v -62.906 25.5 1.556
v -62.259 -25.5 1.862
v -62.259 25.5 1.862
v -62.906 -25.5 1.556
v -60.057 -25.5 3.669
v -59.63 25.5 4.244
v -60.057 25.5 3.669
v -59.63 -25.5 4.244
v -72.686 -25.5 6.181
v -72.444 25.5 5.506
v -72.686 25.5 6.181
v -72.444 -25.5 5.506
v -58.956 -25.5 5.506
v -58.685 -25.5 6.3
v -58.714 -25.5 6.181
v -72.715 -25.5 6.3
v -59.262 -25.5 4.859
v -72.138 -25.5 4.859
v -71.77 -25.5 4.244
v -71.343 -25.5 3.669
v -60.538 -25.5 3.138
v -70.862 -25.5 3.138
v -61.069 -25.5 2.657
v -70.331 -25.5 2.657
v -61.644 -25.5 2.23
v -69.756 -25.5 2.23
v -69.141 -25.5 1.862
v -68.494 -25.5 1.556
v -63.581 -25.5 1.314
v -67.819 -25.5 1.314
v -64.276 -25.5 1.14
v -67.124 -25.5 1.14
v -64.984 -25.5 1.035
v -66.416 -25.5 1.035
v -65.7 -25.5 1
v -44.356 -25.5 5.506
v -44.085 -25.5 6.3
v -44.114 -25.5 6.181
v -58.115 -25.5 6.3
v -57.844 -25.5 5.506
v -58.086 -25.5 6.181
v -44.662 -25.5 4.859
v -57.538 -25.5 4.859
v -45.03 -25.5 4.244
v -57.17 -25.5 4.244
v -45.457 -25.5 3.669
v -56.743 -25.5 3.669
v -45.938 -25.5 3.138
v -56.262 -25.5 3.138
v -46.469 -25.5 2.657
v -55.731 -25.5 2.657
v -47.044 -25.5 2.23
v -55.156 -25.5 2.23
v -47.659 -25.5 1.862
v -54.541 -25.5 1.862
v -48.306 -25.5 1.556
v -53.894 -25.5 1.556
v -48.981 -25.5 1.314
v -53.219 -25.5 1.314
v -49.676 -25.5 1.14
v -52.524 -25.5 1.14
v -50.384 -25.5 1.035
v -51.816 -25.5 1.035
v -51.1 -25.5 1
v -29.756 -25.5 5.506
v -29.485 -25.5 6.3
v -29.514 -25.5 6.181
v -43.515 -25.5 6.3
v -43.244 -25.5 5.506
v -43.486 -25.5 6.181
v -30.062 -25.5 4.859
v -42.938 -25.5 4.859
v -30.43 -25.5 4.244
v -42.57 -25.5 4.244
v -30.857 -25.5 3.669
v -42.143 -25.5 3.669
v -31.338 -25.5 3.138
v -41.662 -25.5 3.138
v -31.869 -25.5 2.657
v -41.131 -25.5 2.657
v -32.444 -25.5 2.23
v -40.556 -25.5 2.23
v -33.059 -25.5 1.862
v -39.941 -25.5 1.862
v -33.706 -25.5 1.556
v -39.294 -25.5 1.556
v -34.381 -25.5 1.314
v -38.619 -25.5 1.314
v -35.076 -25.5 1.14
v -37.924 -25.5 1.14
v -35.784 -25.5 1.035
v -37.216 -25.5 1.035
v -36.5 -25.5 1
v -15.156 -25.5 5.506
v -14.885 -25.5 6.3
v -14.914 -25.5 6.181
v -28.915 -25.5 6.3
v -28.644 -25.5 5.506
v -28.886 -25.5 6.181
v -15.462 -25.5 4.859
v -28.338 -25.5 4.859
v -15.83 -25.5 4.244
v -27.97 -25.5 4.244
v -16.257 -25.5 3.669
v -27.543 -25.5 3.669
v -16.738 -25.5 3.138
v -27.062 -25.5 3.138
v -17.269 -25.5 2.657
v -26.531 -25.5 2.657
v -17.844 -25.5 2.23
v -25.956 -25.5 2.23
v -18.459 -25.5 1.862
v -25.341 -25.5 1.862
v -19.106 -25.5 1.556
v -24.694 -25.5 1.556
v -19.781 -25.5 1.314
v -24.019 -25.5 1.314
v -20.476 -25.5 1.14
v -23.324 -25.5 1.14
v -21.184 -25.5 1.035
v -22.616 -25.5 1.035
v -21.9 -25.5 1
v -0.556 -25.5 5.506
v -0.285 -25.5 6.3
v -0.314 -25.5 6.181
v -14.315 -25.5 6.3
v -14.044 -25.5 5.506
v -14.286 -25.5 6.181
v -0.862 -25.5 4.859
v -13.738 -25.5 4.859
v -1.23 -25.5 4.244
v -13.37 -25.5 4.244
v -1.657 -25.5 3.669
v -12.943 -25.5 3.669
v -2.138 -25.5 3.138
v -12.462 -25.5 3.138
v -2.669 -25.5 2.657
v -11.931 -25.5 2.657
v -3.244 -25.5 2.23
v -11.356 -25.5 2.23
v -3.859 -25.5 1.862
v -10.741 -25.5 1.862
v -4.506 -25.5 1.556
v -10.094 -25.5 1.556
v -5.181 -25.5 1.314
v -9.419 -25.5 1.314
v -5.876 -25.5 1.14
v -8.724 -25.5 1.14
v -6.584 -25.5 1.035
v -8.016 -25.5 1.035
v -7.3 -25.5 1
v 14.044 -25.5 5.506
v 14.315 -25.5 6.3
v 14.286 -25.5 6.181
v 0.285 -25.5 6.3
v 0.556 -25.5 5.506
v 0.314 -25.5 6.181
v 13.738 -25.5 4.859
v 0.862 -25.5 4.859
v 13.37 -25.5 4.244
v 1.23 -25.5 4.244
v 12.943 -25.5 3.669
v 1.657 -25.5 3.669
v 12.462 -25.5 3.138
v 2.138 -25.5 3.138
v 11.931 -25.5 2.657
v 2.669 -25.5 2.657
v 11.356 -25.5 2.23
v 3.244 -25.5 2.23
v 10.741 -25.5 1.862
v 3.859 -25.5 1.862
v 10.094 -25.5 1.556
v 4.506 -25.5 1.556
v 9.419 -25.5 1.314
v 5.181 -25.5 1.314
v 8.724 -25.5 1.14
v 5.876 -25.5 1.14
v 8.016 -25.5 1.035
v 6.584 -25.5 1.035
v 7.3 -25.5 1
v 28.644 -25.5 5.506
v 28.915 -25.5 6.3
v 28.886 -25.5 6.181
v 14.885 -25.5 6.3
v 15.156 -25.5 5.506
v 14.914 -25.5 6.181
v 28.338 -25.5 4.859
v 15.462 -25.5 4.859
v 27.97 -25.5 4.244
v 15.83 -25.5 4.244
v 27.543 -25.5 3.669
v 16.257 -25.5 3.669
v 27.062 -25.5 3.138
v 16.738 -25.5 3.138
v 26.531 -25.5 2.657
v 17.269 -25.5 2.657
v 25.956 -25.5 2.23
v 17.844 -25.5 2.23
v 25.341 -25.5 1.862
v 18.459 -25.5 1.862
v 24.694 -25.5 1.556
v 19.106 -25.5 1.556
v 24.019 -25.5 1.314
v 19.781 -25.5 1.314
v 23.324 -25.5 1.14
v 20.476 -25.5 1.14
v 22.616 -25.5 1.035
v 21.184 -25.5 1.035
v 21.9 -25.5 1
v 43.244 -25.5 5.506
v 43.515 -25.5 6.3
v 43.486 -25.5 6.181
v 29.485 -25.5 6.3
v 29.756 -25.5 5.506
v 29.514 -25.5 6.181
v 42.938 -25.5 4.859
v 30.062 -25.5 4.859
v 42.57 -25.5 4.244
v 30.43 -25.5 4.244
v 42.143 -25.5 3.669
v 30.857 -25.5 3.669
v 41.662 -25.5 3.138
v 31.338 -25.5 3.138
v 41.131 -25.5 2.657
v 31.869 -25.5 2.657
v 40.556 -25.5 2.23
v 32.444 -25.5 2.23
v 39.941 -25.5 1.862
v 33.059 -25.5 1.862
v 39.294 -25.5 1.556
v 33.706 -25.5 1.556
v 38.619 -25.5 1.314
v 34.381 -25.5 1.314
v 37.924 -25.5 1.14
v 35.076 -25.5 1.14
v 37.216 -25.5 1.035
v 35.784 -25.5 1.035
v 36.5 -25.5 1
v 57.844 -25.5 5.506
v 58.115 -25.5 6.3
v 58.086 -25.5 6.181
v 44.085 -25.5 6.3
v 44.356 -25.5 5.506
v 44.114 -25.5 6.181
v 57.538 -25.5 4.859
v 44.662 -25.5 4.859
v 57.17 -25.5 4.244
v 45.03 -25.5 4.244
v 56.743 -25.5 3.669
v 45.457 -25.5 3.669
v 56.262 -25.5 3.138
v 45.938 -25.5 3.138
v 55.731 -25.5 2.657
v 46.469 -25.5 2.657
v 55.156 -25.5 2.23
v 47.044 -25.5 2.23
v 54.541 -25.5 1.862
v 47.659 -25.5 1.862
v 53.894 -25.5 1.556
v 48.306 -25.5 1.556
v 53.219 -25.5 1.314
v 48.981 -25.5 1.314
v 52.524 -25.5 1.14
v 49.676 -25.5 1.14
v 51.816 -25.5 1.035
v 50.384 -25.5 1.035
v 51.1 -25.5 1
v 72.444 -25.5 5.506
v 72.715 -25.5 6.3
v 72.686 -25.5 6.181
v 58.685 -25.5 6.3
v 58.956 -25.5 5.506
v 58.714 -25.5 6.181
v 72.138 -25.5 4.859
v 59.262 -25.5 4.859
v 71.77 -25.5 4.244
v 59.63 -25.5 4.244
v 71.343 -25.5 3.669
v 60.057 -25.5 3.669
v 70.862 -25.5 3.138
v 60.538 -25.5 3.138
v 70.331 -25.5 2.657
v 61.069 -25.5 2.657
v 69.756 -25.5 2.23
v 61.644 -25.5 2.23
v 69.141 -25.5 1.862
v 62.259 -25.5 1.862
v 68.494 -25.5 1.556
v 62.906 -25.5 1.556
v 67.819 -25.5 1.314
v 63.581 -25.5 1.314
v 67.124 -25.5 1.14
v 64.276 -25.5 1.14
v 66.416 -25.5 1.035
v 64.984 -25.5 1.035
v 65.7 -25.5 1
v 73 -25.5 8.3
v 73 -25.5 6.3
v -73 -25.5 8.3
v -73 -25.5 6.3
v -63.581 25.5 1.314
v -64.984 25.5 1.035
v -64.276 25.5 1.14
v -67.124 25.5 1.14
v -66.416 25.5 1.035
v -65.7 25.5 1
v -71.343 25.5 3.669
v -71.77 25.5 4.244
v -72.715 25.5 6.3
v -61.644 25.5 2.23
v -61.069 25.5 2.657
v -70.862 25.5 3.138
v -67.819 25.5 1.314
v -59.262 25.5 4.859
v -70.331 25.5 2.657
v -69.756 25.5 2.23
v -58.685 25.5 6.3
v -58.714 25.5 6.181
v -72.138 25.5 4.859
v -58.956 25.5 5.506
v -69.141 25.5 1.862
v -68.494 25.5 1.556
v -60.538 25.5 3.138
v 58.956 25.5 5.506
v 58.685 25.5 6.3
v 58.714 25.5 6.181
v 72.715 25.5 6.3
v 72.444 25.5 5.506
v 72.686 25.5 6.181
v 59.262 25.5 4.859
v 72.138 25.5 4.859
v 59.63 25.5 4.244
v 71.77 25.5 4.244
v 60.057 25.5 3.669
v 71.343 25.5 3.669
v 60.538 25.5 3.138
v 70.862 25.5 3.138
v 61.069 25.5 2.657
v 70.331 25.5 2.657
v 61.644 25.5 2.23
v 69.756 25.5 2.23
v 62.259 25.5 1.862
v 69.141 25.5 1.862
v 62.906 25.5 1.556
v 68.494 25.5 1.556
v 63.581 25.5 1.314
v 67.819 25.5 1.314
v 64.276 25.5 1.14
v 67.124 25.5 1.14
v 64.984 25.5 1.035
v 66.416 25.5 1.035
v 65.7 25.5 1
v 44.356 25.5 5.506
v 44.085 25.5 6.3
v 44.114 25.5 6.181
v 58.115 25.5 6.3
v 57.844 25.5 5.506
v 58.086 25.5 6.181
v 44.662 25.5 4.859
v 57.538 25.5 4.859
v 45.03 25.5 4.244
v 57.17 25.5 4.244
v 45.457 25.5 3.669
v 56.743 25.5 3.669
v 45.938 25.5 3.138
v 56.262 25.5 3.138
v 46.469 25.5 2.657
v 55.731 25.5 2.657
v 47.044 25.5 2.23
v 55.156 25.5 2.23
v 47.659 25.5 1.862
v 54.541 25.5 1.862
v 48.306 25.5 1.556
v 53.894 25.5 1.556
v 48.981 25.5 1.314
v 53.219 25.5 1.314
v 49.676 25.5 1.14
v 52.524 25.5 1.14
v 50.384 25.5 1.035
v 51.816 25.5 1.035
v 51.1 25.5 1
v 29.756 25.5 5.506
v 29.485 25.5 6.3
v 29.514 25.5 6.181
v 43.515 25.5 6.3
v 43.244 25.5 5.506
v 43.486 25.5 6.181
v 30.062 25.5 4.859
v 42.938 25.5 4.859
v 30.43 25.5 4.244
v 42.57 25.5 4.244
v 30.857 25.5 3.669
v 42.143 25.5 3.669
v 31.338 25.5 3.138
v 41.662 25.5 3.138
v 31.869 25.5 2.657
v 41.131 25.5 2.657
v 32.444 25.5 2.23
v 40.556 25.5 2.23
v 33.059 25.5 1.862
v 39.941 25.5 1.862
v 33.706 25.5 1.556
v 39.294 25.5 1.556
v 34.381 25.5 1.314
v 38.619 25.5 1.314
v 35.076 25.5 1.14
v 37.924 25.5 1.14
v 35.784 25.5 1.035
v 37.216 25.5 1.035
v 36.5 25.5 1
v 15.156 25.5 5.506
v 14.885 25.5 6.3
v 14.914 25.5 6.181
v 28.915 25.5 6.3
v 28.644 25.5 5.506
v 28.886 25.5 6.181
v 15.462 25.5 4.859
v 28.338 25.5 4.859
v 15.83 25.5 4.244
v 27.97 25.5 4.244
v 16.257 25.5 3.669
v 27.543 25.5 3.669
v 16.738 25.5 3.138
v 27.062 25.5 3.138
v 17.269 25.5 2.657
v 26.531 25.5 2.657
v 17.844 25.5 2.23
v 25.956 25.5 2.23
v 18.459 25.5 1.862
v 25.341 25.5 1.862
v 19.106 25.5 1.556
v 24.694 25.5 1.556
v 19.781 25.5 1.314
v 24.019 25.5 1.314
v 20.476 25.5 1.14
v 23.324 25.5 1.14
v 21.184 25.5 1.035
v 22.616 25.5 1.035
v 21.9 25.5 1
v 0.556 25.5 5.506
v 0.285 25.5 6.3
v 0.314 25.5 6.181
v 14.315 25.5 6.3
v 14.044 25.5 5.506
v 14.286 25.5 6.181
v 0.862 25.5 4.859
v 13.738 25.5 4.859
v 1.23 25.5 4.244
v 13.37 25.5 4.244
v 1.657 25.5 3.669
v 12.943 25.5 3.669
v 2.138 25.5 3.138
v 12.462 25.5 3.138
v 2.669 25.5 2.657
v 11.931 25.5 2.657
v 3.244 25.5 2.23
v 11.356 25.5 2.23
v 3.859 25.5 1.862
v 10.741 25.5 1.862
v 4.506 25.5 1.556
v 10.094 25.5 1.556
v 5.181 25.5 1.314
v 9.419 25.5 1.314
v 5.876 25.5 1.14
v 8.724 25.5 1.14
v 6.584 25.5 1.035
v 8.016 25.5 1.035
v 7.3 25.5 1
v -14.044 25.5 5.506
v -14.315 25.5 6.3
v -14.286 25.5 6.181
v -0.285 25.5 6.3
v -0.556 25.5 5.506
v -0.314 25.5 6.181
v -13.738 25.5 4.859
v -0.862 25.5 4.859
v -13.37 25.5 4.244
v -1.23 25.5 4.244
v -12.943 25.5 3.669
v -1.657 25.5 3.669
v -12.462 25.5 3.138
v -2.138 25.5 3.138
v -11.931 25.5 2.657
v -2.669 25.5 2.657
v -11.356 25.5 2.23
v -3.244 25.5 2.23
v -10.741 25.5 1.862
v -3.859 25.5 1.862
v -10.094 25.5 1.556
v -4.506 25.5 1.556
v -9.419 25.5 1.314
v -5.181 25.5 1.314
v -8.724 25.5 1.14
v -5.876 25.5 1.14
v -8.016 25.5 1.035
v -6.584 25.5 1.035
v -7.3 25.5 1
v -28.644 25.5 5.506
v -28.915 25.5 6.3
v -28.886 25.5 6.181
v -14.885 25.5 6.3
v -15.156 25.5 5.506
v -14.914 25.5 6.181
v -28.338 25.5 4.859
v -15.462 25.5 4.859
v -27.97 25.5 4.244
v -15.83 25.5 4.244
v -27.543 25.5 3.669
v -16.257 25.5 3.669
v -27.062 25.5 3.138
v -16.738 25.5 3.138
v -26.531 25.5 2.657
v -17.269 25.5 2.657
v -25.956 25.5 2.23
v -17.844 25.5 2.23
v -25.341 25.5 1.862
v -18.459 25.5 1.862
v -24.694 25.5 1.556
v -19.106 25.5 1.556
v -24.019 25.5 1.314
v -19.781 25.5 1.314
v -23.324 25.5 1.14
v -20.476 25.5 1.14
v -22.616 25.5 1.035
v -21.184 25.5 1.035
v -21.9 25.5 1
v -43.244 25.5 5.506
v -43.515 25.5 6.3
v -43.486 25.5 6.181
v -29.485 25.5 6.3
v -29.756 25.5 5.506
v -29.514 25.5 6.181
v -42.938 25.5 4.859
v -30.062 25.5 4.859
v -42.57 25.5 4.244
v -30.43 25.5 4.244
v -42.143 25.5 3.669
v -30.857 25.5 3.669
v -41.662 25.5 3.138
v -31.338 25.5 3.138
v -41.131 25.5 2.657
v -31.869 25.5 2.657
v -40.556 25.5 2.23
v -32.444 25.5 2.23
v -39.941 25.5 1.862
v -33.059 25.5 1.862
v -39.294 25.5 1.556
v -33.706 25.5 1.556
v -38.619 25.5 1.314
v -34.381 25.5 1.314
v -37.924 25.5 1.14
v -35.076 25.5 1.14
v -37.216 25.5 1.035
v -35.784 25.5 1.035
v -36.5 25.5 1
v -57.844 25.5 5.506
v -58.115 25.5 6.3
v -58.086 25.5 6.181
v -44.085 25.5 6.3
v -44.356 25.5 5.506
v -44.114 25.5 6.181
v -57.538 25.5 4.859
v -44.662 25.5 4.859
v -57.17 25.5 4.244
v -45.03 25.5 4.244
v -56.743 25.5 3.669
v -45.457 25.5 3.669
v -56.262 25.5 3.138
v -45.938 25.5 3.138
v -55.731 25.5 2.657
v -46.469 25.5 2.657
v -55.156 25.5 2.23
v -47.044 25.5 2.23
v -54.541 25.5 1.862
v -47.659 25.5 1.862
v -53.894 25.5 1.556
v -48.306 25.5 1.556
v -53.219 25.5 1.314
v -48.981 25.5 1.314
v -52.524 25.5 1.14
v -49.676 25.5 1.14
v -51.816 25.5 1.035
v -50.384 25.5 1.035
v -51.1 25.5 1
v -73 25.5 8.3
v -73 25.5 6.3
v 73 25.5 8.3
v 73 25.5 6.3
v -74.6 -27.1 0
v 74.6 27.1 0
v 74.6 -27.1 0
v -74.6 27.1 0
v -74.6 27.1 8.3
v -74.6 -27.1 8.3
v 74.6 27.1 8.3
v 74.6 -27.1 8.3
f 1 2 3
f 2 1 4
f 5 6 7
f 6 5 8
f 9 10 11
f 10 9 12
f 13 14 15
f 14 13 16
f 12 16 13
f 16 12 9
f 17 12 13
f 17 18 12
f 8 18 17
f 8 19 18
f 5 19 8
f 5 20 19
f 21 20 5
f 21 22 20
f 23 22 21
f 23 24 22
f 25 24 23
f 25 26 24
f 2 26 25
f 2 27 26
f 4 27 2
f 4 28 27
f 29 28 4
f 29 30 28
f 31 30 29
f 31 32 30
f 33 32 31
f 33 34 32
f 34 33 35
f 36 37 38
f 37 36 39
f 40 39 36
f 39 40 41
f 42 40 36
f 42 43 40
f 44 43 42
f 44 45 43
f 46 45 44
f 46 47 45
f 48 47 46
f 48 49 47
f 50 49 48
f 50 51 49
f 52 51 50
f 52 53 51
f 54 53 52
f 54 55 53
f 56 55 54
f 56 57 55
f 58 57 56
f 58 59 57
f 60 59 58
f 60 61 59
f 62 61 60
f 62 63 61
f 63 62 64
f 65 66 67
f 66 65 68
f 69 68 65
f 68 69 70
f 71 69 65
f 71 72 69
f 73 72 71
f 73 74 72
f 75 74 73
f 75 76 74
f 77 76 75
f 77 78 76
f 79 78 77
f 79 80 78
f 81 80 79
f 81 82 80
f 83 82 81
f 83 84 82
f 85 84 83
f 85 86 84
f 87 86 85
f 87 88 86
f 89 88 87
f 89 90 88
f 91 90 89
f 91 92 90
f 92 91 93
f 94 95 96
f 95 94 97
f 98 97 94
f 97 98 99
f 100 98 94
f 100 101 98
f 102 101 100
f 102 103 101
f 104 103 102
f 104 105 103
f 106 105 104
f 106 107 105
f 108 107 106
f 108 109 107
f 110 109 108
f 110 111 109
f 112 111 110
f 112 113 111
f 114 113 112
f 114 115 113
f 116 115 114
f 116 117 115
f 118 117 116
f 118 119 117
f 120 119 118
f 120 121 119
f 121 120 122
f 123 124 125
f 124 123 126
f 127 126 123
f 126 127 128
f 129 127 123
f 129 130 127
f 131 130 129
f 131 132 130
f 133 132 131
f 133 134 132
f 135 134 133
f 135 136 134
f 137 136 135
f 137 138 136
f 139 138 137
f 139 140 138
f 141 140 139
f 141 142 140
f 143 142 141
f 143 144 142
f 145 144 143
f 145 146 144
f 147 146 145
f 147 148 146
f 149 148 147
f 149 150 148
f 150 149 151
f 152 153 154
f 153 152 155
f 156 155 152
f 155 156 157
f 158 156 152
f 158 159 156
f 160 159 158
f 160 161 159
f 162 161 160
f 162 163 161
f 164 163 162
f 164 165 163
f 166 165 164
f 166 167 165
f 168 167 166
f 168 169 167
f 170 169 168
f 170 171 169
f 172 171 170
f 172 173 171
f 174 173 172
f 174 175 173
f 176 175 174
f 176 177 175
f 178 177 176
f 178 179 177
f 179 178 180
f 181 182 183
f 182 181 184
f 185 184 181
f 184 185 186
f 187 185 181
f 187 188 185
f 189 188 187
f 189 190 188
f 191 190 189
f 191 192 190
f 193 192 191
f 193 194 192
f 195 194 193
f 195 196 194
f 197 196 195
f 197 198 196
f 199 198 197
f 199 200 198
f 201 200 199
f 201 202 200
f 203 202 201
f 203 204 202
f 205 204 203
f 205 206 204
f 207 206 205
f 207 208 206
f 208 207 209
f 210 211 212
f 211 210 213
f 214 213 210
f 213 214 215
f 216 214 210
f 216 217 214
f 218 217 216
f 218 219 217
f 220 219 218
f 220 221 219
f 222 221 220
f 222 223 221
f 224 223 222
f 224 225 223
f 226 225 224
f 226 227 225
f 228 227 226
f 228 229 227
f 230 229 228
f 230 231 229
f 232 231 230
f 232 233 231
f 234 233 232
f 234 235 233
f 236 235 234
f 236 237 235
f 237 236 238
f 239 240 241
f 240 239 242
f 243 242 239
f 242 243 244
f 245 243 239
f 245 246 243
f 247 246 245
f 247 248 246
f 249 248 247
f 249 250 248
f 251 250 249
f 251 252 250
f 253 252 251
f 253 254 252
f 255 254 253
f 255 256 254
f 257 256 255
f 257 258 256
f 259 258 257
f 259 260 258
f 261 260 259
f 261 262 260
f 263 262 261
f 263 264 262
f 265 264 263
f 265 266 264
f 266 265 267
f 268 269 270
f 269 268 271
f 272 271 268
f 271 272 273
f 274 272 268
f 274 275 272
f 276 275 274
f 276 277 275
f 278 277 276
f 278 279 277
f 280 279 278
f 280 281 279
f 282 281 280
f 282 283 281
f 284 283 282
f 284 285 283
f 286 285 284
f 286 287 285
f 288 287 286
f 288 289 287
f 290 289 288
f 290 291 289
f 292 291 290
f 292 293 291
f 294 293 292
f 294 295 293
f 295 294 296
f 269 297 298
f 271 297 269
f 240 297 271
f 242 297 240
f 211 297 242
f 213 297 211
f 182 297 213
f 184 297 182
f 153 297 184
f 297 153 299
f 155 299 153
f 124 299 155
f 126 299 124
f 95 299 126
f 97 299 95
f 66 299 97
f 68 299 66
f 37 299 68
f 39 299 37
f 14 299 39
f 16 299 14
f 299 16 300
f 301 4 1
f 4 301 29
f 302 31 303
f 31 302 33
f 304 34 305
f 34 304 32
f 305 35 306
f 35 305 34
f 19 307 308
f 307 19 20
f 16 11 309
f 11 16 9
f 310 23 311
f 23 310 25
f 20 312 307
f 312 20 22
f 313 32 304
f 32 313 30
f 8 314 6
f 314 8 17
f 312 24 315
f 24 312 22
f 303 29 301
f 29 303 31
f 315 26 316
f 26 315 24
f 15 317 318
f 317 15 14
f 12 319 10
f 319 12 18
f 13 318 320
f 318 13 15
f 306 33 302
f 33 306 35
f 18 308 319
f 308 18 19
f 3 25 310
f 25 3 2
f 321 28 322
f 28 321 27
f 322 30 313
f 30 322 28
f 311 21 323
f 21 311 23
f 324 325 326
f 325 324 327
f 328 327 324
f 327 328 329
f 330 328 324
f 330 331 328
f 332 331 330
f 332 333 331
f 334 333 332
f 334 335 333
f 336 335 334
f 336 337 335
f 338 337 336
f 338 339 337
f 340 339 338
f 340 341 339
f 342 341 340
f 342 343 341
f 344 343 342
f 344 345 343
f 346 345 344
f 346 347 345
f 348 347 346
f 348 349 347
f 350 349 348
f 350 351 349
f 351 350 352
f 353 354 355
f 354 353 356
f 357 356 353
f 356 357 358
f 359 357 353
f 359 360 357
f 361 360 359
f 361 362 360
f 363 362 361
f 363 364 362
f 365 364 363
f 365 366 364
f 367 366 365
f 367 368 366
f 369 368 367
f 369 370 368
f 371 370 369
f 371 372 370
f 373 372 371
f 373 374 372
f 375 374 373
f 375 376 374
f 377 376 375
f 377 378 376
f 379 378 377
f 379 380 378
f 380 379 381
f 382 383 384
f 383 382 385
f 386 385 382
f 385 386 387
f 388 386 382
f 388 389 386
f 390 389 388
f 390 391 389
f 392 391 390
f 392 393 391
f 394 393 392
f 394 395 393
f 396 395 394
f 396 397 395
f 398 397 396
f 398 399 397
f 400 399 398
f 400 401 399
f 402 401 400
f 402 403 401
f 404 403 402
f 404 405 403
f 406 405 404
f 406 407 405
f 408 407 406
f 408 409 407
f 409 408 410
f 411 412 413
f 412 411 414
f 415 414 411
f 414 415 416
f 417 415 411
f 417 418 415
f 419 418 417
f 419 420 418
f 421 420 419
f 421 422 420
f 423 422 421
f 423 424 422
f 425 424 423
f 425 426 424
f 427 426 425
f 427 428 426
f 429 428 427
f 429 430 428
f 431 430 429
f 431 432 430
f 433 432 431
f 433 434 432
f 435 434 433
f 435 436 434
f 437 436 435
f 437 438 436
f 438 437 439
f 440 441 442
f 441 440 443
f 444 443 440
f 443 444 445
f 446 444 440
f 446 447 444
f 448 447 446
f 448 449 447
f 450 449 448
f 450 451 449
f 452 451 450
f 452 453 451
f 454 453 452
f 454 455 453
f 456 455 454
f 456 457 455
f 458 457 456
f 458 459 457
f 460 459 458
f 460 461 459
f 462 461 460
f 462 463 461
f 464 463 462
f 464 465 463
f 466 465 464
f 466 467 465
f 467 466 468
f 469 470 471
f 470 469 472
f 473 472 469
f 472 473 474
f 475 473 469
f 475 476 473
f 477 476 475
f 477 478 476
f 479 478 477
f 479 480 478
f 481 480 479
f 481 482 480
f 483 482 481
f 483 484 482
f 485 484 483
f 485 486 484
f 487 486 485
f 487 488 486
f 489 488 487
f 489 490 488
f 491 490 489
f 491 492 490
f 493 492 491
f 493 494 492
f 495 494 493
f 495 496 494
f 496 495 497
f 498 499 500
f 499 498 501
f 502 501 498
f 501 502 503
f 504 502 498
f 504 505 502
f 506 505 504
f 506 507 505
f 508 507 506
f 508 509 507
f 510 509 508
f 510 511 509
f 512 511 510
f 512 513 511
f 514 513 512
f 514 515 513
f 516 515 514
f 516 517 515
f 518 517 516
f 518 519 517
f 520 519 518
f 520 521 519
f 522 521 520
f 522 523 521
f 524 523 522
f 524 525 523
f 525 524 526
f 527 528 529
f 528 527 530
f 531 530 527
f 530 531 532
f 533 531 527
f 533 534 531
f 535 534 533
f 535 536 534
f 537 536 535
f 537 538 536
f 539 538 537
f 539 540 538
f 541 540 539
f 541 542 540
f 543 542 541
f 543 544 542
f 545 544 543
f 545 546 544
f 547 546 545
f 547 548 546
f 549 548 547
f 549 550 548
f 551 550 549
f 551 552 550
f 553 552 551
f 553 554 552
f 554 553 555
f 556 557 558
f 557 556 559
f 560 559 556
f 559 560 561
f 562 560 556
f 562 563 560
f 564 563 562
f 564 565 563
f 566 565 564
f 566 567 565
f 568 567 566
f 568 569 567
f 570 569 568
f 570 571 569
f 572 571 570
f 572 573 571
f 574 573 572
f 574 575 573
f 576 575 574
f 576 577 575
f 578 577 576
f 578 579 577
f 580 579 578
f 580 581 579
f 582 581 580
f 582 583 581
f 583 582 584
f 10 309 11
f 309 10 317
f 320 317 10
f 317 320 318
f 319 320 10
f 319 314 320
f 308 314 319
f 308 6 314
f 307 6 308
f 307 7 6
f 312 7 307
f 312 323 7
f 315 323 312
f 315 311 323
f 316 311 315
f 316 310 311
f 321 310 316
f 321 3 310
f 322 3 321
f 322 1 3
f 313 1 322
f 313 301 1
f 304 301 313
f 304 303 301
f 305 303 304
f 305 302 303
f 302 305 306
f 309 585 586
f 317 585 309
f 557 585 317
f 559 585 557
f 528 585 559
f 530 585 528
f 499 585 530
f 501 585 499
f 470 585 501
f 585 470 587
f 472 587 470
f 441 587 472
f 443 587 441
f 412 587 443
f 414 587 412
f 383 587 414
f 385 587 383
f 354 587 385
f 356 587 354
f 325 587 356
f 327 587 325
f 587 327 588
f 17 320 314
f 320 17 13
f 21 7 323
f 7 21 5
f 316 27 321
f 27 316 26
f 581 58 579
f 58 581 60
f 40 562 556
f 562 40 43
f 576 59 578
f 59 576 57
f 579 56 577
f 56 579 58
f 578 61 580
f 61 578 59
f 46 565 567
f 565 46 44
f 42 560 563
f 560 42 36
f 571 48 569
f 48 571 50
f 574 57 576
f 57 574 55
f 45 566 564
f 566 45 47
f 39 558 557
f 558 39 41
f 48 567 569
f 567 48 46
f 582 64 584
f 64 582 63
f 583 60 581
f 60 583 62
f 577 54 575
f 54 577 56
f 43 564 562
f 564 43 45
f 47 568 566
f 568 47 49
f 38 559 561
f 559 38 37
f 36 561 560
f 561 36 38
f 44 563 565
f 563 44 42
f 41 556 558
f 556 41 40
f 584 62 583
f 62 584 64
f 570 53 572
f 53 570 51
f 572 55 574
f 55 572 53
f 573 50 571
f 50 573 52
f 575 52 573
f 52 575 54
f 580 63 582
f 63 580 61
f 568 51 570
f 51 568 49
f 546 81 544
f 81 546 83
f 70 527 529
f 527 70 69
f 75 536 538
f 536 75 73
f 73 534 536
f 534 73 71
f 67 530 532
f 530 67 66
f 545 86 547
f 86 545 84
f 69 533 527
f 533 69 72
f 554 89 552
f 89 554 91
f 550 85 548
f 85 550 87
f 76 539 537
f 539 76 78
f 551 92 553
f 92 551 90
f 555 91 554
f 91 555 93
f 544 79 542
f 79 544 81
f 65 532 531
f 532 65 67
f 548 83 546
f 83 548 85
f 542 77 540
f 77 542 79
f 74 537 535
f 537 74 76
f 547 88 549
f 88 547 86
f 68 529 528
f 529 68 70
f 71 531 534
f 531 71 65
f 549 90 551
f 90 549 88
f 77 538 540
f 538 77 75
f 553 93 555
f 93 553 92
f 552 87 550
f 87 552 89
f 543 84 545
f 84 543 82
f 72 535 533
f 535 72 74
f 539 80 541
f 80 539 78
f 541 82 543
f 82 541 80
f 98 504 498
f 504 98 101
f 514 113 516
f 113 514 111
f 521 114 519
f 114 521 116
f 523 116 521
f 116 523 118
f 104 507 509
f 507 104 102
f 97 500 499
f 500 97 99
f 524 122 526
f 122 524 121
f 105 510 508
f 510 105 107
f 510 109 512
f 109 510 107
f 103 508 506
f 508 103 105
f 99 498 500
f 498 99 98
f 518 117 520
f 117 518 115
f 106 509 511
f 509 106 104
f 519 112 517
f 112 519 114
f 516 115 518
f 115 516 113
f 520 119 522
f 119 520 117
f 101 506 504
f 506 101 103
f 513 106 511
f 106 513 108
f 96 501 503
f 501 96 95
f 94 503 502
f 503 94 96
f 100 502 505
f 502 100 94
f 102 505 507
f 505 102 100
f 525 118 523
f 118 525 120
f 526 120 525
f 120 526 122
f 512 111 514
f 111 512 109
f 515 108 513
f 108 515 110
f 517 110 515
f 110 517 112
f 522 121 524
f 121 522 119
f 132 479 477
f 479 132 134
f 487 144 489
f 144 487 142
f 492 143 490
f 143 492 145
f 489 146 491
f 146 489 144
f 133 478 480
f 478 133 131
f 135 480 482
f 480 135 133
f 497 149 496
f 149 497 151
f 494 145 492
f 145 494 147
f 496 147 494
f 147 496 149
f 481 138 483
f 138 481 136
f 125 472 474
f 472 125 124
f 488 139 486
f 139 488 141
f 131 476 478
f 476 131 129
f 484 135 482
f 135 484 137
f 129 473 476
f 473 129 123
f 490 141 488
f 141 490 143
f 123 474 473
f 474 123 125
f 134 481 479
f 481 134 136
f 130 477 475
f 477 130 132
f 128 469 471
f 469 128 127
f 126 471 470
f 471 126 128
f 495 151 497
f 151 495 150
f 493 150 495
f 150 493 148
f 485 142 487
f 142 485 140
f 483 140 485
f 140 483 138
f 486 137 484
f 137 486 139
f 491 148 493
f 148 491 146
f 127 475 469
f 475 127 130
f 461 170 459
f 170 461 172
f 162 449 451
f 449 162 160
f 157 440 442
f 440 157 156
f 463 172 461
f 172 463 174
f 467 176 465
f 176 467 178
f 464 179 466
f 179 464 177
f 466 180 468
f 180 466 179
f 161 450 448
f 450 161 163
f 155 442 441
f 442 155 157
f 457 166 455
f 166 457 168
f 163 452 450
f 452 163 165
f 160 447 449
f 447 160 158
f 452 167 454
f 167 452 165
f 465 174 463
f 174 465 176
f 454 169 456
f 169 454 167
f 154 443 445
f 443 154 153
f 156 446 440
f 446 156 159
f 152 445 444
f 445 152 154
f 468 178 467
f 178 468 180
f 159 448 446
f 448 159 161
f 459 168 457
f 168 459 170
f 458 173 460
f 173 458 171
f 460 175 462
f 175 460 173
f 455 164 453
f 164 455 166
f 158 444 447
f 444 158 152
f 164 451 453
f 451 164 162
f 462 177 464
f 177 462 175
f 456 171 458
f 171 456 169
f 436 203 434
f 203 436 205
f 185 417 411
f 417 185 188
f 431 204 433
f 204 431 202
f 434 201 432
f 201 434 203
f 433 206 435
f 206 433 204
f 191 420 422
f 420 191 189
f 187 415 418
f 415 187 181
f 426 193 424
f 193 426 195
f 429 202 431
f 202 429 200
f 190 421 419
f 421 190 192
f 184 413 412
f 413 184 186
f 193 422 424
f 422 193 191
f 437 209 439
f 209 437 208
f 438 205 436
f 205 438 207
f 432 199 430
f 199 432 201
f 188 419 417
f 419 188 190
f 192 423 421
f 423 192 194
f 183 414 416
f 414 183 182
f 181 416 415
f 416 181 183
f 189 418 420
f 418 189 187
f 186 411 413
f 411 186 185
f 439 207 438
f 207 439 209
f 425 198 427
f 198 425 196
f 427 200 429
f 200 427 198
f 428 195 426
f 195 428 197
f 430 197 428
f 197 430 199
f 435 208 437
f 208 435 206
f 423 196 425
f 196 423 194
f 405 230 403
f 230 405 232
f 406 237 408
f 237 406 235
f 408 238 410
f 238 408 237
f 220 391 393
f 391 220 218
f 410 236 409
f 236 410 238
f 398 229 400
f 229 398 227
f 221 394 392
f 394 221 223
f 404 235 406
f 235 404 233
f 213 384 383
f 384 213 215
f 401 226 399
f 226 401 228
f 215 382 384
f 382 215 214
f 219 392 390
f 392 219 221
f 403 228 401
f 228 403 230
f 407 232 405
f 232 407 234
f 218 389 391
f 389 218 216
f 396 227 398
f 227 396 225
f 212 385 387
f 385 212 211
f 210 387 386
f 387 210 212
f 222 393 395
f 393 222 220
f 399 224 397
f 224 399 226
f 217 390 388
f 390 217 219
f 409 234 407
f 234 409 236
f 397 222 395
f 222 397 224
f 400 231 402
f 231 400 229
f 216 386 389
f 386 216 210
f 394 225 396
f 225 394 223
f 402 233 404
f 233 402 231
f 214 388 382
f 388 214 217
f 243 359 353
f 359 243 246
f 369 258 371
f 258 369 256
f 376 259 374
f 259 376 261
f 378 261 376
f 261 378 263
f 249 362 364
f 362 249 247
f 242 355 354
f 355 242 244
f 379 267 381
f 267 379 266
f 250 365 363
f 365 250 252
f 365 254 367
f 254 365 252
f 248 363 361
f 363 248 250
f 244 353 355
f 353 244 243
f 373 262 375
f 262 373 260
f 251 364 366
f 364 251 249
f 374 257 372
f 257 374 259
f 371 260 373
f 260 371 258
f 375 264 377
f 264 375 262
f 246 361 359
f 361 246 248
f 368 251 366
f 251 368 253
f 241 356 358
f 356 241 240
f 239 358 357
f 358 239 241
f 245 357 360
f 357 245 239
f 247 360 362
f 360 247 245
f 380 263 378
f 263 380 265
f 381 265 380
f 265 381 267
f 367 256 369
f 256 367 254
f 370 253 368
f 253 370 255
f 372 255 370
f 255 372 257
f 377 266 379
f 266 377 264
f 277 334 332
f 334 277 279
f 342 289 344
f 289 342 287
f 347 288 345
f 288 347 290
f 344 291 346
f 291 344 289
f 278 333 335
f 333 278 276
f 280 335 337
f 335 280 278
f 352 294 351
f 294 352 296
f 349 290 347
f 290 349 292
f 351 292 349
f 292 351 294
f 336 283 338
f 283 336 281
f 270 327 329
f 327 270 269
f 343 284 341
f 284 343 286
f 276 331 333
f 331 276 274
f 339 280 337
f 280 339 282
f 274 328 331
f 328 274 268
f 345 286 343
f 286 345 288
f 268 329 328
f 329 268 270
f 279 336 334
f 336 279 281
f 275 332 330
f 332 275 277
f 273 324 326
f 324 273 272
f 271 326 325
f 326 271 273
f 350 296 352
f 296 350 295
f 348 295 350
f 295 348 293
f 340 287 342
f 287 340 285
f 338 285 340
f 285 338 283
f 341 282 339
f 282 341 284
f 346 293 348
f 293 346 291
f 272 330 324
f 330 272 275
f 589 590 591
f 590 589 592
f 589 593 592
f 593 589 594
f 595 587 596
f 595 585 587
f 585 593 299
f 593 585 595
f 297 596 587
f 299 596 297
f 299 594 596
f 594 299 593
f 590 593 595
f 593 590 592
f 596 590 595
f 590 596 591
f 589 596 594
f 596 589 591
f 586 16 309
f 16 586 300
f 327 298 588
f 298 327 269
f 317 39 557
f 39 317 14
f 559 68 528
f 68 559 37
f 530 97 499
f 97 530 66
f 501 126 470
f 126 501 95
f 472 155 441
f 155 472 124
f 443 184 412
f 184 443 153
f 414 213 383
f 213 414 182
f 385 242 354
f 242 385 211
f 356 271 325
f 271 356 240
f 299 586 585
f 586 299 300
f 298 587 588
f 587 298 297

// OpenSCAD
/// Bartłomiej Burdukiewicz

$fn = 64;

nozzle = 0.4;
wall_thickness = nozzle * 4;
base_h = 1.00;


/// 3xA battery length: 45.00mm
/// 2xA battery length: 51.00mm
battery_length = 51.00; 

/// 3xA battery dia: 5.30mm
/// 2xA battery dia: 7.30mm
dia = 7.30;

/// grid size
grid = [10, 1];

$fn = 64;

module lying_cylinder(w = 1.00, r = 5.00, center = true) {
    translate([0, 0, r])
        rotate([90, 0, 0])
            cylinder(w, r, r, center);
}

module alg_next_each_other_x(count = 2, w = 10.00, center = true) {
    translate([center ? -w * count / 2 + w/2 : 0, 0, 0])
        for (offset = [0:count - 1])
            translate([offset * w, 0, 0])
                children();
}

module alg_next_each_other_y(count = 2, w = 10.00, center = true) {
    translate([0, center ? -w * count / 2 + w/2 : 0, 0])
        for (offset = [0:count - 1])
            translate([0, offset * w, 0])
                children();
}

module section(count) {
    difference() {
        linear_extrude(dia + base_h)
            square([count * dia * 2 + wall_thickness * 2, battery_length + wall_thickness * 2], center = true);

        translate([0, 0, base_h])
            alg_next_each_other_x(count, dia * 2)
                lying_cylinder(battery_length, dia, true);

        translate([0, 0, dia + base_h - 2])
            linear_extrude(2)
                square([count * dia * 2, battery_length], center = true);
    }
}

alg_next_each_other_y(grid[1], w = battery_length + wall_thickness)
    section(grid[0]);
